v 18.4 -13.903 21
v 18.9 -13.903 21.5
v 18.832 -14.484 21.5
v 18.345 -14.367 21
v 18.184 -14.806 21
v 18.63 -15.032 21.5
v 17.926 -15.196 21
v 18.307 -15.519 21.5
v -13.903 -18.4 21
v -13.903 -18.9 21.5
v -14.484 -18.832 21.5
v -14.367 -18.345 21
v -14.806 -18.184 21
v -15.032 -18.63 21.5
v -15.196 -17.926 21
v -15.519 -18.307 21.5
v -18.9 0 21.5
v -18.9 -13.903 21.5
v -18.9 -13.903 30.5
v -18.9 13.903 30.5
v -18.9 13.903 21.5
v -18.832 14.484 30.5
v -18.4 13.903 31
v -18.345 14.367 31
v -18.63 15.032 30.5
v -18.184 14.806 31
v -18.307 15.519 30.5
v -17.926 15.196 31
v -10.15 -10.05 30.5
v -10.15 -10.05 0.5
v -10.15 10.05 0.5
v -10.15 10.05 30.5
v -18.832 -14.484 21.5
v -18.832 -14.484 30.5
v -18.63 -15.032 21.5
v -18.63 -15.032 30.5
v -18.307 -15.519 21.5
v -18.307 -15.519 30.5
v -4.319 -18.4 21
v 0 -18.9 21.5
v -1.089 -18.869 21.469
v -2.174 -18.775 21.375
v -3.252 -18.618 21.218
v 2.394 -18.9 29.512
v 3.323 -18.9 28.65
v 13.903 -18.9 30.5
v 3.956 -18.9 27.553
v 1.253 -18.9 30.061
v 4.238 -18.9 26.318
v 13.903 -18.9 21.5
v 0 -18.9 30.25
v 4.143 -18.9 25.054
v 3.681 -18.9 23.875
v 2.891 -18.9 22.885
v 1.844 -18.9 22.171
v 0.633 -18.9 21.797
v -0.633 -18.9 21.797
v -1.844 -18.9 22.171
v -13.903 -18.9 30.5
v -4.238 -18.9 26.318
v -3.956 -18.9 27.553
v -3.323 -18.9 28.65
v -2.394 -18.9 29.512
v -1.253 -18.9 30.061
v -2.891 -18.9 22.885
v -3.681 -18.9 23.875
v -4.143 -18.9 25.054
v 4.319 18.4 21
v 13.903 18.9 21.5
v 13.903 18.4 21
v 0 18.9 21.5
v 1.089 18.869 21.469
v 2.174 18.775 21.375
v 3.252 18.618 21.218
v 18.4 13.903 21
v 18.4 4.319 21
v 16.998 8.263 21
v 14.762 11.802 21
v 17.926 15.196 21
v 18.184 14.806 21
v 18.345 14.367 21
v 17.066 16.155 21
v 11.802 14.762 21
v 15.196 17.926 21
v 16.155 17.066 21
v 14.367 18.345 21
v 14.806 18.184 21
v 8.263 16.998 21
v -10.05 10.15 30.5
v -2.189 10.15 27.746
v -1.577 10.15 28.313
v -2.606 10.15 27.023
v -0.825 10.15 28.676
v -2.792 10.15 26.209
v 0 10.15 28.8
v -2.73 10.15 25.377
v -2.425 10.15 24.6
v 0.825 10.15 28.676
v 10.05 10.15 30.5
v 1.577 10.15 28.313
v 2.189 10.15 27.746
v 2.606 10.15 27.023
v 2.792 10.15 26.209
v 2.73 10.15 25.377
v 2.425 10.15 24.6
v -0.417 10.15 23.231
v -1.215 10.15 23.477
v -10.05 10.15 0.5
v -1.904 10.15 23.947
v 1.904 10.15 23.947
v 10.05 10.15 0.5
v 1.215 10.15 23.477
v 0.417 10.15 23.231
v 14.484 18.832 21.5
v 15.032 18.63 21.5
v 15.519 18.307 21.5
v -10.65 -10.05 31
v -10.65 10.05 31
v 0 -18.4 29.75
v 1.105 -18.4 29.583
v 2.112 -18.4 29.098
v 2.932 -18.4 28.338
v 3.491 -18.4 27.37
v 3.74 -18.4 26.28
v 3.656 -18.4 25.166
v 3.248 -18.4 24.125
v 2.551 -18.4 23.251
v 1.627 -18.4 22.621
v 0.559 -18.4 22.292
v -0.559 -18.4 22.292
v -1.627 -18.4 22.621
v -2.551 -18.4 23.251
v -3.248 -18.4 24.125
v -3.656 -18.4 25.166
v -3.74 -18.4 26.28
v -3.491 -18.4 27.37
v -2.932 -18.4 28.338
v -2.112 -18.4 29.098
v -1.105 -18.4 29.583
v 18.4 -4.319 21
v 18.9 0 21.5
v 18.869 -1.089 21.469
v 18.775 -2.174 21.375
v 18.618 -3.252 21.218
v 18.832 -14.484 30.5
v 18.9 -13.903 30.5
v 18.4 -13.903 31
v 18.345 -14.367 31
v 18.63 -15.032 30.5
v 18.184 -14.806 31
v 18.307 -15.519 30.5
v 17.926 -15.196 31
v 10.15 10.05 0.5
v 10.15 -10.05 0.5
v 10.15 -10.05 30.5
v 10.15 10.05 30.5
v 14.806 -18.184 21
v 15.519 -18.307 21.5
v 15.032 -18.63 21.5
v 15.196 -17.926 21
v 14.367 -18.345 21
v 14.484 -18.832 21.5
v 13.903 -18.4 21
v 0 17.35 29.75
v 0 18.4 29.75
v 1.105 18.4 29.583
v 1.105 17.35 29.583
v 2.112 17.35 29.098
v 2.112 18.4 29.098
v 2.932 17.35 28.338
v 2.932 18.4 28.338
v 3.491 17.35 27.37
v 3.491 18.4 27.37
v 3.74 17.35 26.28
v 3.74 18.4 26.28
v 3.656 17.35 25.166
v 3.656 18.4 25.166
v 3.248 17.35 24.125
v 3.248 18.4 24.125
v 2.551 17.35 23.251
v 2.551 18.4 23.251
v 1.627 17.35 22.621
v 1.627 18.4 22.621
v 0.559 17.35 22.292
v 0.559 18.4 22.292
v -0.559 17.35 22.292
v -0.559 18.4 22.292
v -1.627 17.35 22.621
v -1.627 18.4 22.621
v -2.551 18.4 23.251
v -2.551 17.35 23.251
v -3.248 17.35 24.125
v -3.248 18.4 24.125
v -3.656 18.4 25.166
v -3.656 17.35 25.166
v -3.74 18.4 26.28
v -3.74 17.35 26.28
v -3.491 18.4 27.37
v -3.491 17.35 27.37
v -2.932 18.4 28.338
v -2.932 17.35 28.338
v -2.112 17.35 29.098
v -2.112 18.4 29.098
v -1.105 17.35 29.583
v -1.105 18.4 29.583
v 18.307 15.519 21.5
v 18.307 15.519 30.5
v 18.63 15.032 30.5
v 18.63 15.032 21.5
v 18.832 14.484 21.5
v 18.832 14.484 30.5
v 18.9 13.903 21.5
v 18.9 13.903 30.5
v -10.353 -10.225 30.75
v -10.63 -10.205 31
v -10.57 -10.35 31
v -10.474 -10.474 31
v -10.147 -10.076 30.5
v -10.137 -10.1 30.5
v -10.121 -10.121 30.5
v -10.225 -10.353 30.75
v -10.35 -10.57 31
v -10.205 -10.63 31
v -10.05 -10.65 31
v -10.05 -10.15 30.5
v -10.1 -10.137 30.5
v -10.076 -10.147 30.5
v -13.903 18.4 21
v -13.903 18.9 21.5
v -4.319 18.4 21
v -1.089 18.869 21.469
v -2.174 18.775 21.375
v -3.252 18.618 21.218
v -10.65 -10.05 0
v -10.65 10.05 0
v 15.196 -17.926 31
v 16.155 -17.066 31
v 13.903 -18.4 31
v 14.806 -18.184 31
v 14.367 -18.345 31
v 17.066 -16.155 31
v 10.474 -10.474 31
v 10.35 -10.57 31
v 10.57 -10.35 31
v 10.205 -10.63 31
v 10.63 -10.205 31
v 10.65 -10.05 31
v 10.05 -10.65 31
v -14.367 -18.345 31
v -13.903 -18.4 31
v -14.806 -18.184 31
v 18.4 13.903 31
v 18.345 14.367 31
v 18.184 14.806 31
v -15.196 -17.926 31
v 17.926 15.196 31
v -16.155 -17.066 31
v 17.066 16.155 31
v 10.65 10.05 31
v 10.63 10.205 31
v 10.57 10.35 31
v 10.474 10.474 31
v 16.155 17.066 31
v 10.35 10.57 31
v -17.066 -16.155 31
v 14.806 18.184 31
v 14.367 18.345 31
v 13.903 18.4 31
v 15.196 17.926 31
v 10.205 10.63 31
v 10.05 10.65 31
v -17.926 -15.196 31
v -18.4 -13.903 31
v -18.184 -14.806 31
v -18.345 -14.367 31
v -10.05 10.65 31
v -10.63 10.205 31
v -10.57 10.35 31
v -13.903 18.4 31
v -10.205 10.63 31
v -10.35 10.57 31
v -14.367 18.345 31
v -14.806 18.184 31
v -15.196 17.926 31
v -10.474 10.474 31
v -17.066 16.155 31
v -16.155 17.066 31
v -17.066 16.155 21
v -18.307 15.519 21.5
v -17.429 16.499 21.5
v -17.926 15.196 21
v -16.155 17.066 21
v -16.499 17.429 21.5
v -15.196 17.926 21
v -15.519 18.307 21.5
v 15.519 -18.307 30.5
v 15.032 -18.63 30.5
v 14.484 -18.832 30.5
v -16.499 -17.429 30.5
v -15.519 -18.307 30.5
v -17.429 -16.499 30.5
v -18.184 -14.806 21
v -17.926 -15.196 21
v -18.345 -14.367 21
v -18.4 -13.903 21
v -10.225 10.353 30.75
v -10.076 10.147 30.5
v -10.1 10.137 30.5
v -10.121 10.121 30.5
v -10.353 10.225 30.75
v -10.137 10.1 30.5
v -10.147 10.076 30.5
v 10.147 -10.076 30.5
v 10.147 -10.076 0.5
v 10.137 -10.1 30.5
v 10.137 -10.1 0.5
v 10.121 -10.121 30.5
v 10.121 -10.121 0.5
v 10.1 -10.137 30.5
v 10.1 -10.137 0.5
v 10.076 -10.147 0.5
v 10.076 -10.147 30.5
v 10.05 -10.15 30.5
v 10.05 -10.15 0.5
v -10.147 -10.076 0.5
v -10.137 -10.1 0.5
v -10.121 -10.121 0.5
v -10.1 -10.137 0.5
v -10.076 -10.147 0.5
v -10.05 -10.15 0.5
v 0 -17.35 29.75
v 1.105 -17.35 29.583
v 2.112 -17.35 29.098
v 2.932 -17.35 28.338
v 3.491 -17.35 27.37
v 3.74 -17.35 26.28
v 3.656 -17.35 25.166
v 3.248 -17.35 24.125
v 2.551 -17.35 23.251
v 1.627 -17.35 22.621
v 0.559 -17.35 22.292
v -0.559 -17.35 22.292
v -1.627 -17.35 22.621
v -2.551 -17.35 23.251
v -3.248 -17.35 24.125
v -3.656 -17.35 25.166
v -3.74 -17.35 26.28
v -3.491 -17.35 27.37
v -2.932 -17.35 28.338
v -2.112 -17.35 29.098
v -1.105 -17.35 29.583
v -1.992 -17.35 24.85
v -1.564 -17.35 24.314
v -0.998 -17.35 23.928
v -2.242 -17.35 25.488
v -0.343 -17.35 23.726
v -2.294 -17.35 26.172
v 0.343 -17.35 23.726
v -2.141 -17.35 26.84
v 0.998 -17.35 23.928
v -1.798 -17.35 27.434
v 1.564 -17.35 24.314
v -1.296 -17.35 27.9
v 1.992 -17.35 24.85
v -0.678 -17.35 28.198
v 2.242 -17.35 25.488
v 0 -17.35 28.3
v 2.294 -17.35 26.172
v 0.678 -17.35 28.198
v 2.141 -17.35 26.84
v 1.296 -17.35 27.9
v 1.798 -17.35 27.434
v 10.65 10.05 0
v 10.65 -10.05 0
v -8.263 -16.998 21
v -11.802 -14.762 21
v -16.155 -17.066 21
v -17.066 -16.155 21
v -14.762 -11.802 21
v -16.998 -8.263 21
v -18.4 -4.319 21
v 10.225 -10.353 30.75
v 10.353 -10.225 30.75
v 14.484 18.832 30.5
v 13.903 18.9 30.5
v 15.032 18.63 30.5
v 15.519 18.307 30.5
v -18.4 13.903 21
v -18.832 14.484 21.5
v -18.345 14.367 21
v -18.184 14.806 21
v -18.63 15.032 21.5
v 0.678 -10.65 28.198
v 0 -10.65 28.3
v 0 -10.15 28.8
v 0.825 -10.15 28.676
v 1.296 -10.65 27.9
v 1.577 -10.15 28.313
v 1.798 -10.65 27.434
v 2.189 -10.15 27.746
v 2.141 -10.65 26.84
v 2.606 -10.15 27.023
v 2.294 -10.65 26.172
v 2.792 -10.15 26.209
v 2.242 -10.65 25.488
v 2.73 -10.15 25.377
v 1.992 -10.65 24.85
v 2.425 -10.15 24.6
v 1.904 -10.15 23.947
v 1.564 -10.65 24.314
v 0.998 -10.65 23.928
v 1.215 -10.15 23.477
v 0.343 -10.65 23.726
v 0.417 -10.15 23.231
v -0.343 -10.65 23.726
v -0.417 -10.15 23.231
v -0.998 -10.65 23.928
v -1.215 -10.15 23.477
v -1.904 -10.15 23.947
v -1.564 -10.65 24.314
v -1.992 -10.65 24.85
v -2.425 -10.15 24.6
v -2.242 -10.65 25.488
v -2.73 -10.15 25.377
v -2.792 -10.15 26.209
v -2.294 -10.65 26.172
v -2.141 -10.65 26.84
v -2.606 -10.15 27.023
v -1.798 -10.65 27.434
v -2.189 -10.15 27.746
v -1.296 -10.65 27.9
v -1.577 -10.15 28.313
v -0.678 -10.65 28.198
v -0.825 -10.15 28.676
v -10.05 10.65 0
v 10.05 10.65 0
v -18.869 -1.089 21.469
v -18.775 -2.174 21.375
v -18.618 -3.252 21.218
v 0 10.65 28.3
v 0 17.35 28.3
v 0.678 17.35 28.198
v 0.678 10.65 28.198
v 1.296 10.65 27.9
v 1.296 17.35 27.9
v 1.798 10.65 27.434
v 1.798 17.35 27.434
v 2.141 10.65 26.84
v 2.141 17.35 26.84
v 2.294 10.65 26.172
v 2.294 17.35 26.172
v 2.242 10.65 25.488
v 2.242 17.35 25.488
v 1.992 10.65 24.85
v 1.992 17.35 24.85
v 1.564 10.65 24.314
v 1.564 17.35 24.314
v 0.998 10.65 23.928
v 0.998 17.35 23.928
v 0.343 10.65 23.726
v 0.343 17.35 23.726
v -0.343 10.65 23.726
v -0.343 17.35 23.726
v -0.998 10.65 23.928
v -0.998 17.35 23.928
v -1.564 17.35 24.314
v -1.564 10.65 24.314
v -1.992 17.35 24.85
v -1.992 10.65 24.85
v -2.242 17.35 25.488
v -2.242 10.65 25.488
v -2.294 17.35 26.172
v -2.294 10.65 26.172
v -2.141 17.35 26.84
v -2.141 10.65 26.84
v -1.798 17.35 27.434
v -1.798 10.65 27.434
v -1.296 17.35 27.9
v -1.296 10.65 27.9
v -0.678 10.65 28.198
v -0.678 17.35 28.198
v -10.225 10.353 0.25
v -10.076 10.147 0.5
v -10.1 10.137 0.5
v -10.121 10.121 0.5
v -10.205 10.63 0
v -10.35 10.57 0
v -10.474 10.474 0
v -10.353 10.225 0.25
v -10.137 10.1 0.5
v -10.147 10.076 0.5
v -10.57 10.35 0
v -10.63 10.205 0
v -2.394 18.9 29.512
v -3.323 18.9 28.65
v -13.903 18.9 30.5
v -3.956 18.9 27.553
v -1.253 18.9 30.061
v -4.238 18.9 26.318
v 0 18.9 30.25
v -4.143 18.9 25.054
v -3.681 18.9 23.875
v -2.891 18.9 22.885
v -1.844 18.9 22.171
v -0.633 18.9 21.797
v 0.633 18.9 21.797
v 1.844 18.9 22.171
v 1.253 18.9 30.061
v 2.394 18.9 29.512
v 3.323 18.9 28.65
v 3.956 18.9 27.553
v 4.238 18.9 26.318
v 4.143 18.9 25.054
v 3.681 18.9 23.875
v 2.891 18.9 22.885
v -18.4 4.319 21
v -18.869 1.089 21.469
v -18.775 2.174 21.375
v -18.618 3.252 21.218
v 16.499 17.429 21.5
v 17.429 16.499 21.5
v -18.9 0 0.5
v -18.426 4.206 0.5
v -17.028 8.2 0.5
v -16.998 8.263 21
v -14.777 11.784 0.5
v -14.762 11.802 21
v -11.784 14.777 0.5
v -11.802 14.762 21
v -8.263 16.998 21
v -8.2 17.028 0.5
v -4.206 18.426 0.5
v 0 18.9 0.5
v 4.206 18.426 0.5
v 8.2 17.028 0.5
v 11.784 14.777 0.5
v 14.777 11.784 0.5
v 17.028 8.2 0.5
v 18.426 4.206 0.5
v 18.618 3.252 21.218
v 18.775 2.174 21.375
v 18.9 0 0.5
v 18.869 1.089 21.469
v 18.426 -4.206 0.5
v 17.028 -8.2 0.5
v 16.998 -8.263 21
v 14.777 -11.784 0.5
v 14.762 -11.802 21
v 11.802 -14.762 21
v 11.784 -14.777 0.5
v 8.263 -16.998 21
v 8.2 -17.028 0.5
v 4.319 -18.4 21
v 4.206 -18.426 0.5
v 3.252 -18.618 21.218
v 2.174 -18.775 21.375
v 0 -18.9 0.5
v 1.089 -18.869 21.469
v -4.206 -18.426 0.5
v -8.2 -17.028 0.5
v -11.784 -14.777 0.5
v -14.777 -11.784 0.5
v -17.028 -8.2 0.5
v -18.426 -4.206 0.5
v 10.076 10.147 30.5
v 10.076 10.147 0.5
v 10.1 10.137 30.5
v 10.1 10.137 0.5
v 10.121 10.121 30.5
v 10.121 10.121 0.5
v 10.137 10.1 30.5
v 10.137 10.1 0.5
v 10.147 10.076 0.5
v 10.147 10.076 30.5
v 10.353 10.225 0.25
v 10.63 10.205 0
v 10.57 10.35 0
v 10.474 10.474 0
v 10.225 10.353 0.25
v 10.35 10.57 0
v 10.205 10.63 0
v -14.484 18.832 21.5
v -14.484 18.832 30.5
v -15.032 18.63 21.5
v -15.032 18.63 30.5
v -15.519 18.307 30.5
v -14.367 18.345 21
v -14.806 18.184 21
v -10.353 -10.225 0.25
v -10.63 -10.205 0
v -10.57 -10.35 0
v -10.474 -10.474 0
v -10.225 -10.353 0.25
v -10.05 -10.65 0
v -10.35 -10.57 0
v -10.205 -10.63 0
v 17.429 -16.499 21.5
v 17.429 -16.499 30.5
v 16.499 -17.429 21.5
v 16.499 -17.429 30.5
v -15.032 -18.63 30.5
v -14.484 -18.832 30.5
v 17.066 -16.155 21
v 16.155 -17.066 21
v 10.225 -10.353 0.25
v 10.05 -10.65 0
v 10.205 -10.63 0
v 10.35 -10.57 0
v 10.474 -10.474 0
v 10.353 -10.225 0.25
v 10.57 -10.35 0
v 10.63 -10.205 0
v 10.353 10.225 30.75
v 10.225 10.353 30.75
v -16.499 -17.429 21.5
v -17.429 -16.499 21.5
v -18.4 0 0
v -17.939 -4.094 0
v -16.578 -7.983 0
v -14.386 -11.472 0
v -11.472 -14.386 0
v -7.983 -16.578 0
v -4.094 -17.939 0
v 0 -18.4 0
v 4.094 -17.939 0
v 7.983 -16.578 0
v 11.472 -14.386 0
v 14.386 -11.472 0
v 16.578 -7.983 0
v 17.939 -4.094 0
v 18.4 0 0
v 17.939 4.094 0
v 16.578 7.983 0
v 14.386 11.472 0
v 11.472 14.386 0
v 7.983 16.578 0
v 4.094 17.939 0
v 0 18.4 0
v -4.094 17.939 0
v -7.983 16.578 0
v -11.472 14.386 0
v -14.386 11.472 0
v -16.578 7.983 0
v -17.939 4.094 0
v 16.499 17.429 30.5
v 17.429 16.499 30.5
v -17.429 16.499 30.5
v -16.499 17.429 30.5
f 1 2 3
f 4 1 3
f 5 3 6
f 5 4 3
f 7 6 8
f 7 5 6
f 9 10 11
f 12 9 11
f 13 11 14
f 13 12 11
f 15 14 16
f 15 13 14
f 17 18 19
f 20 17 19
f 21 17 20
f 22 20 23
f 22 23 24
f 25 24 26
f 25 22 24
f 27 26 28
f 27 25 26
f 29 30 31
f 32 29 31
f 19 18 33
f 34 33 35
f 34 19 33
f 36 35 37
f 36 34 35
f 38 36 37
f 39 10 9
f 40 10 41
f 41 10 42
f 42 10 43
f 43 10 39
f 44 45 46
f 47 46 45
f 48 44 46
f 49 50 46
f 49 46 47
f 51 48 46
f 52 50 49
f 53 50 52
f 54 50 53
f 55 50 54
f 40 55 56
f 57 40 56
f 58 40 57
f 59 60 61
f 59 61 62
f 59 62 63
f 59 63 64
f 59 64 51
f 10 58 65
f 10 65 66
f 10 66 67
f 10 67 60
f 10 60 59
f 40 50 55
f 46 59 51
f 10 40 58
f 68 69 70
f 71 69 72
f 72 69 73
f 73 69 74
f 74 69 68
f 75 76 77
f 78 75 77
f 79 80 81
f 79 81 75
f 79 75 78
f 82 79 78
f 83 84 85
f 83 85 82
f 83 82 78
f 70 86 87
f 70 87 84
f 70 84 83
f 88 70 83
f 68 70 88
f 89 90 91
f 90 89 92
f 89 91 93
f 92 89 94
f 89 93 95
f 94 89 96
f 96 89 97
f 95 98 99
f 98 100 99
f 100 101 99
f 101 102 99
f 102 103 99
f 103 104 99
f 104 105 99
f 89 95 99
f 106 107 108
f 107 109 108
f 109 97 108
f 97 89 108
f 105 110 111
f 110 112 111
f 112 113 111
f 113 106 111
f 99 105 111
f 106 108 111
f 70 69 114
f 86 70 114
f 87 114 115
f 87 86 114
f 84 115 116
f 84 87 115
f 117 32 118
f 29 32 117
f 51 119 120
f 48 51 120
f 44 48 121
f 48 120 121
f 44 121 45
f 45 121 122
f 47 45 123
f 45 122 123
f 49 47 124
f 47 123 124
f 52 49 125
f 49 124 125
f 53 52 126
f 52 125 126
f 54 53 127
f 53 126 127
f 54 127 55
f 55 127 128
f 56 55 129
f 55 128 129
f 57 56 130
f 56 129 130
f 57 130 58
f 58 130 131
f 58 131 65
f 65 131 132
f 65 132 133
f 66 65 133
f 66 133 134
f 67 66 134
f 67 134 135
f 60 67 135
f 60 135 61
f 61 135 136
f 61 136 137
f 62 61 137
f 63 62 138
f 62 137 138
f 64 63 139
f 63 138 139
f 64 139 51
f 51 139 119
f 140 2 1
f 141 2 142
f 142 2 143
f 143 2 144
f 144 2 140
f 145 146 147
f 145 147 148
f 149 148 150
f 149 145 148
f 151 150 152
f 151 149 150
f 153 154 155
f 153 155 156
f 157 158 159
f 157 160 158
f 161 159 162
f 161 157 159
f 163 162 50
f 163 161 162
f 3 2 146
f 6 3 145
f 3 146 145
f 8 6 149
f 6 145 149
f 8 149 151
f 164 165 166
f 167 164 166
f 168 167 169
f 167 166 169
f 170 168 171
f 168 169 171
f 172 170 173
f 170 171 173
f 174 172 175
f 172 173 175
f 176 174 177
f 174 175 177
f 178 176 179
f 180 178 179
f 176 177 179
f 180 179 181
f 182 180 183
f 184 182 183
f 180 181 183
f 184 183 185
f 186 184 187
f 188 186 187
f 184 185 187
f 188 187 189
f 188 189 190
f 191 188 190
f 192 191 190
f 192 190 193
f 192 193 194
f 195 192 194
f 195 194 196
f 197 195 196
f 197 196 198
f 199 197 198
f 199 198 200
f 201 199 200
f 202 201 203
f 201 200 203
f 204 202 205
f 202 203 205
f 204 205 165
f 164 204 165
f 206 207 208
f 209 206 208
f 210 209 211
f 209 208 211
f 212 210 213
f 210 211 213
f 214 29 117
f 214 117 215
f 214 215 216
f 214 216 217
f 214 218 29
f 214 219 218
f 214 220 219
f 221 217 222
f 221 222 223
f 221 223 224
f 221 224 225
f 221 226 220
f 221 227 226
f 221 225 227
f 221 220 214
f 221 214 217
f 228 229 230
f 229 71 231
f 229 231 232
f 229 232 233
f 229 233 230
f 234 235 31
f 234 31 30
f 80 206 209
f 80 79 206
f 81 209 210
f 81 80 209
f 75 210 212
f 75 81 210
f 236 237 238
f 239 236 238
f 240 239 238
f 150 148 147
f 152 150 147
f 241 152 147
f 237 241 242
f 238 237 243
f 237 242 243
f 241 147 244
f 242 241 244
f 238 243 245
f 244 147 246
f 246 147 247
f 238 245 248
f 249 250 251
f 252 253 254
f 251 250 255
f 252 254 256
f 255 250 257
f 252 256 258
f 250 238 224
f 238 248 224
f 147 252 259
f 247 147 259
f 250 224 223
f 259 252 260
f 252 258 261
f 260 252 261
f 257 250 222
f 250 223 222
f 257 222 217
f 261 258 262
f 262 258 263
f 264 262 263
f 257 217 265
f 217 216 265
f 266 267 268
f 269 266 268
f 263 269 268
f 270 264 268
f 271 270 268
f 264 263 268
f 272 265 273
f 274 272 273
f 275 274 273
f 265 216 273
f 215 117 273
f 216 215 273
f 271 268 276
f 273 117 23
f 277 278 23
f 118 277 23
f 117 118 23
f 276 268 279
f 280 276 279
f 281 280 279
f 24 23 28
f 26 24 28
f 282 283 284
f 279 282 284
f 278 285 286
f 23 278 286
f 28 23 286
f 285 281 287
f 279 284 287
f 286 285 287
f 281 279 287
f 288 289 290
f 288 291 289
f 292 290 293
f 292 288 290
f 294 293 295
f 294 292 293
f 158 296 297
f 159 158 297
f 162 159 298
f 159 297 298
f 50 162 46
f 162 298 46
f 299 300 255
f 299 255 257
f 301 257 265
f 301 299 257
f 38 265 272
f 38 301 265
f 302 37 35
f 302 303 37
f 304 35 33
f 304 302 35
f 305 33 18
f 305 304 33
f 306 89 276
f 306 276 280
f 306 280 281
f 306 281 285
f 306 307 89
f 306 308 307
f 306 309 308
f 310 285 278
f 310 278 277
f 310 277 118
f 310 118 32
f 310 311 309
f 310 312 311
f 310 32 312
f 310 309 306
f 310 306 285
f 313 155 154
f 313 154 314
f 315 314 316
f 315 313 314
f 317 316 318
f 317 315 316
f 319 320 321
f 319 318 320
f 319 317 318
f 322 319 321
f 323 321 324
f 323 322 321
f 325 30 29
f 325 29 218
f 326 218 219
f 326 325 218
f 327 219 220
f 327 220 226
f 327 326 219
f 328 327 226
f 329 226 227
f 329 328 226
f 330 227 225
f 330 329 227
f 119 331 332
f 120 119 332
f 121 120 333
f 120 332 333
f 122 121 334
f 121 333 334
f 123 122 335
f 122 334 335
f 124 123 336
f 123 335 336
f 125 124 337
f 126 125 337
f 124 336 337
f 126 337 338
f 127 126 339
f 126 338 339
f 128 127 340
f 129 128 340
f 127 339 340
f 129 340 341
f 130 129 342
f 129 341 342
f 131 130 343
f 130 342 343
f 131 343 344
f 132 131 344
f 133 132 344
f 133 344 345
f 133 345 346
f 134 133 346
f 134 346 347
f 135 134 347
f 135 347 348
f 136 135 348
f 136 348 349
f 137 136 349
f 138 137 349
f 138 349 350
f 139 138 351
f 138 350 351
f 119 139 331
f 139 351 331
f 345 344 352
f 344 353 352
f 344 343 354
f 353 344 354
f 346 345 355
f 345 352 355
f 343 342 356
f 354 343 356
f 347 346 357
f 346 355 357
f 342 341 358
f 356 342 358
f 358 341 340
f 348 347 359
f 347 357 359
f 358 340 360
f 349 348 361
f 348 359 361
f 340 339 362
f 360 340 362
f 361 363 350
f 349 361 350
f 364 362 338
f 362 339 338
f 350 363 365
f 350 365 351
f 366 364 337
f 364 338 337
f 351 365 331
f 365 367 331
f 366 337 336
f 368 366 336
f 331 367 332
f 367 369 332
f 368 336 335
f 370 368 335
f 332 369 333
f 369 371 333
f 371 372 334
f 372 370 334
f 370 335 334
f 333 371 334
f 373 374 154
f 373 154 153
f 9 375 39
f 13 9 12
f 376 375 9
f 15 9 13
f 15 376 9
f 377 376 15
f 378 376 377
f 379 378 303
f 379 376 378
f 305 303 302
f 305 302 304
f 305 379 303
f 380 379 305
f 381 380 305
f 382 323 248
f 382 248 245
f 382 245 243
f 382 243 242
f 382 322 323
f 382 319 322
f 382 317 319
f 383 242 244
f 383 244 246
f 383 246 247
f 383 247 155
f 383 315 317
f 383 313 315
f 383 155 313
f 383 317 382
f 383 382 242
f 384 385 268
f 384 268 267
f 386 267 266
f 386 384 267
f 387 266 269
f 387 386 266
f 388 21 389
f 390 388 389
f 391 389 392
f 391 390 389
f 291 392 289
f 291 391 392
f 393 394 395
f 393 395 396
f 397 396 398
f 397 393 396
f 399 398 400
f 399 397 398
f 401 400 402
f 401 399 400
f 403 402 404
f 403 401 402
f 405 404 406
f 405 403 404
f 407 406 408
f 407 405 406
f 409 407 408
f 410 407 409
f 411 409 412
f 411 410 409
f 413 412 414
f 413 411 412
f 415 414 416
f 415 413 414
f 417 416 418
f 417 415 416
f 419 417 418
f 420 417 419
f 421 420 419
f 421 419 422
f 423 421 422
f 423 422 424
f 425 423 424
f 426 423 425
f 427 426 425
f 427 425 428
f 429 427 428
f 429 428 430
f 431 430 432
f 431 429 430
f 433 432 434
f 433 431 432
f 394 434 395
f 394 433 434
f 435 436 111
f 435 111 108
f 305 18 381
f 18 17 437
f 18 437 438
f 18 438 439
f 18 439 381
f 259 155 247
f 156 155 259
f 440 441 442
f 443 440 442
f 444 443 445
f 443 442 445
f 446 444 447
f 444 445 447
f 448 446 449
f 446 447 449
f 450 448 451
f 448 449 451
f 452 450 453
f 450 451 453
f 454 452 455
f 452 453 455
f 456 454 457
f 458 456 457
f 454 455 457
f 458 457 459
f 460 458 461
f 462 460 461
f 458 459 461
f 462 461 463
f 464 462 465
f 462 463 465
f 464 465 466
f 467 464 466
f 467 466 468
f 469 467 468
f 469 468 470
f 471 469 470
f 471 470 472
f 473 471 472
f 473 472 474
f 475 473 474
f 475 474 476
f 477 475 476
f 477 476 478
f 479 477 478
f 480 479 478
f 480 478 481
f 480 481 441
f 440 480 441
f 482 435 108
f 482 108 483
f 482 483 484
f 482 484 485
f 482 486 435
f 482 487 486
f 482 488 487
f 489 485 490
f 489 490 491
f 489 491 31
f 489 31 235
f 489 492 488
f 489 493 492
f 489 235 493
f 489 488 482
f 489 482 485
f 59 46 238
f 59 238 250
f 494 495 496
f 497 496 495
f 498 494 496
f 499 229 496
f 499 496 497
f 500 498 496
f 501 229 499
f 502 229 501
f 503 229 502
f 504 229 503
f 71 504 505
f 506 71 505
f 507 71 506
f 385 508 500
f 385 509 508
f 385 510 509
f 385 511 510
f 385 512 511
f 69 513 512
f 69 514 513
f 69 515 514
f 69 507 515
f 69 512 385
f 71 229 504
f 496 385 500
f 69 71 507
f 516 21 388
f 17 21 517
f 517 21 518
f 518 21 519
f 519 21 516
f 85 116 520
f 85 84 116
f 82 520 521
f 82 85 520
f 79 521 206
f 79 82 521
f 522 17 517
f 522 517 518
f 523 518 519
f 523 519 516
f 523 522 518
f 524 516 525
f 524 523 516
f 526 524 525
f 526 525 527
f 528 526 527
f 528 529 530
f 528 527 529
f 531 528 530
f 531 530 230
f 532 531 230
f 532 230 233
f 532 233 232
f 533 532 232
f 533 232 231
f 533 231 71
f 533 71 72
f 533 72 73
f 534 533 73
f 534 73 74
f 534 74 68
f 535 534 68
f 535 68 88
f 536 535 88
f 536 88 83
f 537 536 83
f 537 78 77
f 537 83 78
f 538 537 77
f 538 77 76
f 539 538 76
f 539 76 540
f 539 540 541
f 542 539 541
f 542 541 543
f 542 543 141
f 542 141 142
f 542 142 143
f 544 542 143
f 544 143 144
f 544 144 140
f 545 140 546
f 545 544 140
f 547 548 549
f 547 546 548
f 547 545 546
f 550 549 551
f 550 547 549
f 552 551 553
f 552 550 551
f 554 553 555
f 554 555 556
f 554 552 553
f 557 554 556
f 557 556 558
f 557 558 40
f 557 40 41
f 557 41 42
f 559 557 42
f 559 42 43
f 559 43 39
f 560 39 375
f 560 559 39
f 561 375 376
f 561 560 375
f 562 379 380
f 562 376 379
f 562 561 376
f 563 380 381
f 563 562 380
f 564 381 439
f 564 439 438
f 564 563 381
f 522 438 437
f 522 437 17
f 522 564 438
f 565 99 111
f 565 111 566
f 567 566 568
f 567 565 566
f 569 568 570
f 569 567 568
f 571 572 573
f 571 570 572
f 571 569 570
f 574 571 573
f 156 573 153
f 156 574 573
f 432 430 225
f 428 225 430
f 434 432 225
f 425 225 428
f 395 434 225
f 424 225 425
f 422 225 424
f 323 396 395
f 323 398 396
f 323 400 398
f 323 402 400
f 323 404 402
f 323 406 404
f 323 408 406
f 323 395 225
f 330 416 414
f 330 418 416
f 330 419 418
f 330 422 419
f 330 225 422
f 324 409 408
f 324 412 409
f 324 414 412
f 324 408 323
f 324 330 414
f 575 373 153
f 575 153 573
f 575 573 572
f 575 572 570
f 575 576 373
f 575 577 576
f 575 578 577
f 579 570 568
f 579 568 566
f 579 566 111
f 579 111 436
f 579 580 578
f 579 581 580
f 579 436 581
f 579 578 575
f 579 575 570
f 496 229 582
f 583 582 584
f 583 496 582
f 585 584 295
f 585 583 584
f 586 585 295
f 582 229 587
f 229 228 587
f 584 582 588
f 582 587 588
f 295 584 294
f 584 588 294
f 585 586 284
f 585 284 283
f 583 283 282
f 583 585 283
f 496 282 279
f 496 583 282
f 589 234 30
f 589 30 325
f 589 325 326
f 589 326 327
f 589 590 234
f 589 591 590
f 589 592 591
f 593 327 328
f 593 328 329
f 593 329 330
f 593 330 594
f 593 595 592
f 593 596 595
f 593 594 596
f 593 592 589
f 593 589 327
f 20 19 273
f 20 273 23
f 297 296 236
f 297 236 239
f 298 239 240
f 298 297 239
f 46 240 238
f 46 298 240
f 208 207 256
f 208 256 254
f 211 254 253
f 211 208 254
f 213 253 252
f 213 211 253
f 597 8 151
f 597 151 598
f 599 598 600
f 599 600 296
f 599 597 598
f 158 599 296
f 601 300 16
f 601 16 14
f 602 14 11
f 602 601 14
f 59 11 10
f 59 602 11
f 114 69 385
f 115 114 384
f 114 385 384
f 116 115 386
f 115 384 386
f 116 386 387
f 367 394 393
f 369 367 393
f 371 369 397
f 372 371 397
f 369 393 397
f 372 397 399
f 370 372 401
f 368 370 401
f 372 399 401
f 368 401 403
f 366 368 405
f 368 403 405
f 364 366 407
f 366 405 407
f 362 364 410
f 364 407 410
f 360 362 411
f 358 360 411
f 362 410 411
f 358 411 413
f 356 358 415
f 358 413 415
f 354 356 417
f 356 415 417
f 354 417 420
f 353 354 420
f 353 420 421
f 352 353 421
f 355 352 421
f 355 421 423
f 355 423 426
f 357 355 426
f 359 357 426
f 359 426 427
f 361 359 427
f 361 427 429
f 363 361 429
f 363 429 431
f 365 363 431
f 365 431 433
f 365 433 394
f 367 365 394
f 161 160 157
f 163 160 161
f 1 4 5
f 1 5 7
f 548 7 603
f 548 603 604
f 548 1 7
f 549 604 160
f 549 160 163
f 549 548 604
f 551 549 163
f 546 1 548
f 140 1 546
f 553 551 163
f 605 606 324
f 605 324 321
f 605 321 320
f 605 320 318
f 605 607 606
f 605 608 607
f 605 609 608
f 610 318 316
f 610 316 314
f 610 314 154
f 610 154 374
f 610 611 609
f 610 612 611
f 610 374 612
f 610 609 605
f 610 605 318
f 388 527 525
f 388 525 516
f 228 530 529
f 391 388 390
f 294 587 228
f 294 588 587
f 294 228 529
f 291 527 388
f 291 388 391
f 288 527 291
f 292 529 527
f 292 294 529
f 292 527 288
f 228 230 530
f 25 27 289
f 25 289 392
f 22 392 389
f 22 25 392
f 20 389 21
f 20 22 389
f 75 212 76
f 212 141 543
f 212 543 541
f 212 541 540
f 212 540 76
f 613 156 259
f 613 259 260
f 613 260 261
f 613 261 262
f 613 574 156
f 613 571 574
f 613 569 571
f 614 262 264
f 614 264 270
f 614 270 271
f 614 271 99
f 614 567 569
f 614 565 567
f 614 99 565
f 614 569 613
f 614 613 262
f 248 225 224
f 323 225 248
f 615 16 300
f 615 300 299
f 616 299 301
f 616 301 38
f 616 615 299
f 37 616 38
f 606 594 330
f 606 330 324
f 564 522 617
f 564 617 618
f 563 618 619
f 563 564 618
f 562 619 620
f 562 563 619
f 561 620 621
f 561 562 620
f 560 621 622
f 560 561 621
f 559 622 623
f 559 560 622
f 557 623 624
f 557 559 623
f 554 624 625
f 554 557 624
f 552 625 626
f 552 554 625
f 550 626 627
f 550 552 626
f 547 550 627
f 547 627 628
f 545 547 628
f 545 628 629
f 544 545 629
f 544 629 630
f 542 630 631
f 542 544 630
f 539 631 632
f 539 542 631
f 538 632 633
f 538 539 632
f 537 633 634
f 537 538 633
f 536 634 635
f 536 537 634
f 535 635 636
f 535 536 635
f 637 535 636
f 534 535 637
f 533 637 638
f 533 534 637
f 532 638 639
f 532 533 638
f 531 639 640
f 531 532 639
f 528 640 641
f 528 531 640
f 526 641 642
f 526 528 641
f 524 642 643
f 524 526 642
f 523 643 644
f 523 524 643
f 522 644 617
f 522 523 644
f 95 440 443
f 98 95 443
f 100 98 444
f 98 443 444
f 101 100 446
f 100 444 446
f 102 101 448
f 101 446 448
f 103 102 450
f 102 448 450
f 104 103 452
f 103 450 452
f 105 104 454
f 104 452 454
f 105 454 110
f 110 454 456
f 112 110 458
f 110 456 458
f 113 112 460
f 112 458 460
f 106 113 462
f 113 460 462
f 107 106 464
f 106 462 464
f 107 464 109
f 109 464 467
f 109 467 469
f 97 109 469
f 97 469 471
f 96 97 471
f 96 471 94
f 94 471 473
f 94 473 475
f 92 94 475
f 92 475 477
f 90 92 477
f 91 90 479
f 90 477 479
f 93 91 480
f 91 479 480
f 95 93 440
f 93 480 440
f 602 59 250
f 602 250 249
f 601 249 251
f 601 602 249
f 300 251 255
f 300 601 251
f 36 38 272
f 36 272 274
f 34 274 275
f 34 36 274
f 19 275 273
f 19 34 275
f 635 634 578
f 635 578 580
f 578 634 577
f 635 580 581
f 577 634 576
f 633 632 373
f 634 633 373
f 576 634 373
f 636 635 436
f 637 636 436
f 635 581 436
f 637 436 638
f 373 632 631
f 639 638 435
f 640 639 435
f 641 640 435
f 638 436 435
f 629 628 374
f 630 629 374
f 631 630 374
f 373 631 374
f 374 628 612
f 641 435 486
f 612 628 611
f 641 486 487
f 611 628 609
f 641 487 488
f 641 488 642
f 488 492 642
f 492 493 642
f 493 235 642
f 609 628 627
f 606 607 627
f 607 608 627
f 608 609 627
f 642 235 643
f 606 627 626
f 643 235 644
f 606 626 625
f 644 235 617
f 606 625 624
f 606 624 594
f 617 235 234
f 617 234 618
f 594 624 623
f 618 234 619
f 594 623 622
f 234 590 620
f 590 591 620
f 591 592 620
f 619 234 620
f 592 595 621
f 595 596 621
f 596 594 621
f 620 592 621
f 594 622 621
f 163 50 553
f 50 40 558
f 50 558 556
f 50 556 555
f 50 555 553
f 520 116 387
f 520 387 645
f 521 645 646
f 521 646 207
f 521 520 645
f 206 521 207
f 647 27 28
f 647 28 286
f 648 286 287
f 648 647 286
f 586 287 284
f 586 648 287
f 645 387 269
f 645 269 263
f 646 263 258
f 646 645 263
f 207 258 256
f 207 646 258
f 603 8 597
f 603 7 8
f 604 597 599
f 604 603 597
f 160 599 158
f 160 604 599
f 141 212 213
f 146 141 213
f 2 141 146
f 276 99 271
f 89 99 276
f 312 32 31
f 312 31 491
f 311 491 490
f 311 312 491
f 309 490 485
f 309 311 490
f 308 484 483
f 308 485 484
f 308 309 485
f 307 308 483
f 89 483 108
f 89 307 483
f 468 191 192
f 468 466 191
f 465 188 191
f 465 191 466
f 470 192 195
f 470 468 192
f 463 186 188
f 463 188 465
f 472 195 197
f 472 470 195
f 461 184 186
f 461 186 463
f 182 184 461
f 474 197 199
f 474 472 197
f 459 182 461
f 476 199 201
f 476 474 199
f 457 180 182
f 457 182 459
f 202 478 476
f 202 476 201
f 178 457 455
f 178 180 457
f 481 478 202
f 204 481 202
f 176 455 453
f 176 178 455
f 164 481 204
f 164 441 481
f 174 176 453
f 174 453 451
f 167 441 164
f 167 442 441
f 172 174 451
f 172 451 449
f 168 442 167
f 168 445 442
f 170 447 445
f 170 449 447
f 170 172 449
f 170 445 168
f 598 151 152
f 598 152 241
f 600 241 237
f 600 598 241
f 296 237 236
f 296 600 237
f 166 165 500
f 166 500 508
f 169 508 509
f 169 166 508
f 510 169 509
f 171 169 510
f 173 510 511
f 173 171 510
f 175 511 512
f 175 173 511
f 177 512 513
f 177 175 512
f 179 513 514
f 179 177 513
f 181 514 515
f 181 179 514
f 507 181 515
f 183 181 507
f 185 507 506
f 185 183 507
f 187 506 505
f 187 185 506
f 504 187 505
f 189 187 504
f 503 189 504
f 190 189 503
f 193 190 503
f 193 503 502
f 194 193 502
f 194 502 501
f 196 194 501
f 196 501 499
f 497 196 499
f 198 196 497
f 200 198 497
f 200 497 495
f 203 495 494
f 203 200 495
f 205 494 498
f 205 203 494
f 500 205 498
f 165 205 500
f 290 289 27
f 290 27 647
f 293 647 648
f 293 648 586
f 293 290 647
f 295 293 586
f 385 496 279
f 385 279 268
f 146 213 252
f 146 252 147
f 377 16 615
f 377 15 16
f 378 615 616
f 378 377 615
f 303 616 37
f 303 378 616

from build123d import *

# Parameters (mm, degrees)
SKIZZE1_R                       = 18.9
SKIZZE1_W                       = 20.3
SKIZZE1_H                       = 20.3
AUFSATZ_LINEAR_AUSTRAGEN1_DEPTH = 21
SKIZZE2_W                       = 20.3
SKIZZE2_H                       = 20.3
AUFSATZ_LINEAR_AUSTRAGEN2_DEPTH = 10
SKIZZE3_R                       = 2.3
SCHNITT_LINEAR_AUSTRAGEN1_DEPTH = 53.412307715
SKETCH1_R                       = 3.75
CUT_EXTRUDE1_DEPTH              = 1.55
CUT_EXTRUDE2_START              = -36.25
SKETCH1_2_R                     = 3.75
CUT_EXTRUDE2_DEPTH              = 1.55
VERRUNDUNG1_R                   = 0.1
VERRUNDUNG2_R                   = 2.5
FASE1_SIZE                      = 0.5
FASE4_SIZE                      = 0.5


with BuildPart() as part:
    # Skizze1 → Aufsatz-Linear austragen1 (new body)
    with BuildSketch(Plane.XY):
        with Locations(Location((0, 0, 0), (0, 0, 180))):
            Circle(SKIZZE1_R)
        Rectangle(SKIZZE1_W, SKIZZE1_H, mode=Mode.SUBTRACT)
    extrude(amount=AUFSATZ_LINEAR_AUSTRAGEN1_DEPTH)

    # Skizze2 → Aufsatz-Linear austragen2 (add)
    with BuildSketch(Plane.XY.offset(21)):
        with BuildLine():
            Line((-14.791551643, 18.9), (14.791551643, 18.9))
            ThreePointArc((14.791551643, 18.9), (16.970562748, 16.970562748), (18.9, 14.791551643))
            Line((18.9, 14.791551643), (18.9, -14.791551643))
            ThreePointArc((18.9, -14.791551643), (16.970562748, -16.970562748), (14.791551643, -18.9))
            Line((14.791551643, -18.9), (-14.791551643, -18.9))
            ThreePointArc((-14.791551643, -18.9), (-16.970562748, -16.970562748), (-18.9, -14.791551643))
            Line((-18.9, -14.791551643), (-18.9, 14.791551643))
            ThreePointArc((-18.9, 14.791551643), (-16.970562748, 16.970562748), (-14.791551643, 18.9))
        make_face()
        Rectangle(SKIZZE2_W, SKIZZE2_H, mode=Mode.SUBTRACT)
    extrude(amount=AUFSATZ_LINEAR_AUSTRAGEN2_DEPTH)

    # Skizze3 → Schnitt-Linear austragen1 (cut, through all)
    with BuildSketch(Plane(origin=(0, 18.9, 0), x_dir=(1, 0, 0), z_dir=(0, 1, 0))):
        with Locations(Location((0, -26, 0), (0, 0, 270))):
            Circle(SKIZZE3_R)
    extrude(amount=-SCHNITT_LINEAR_AUSTRAGEN1_DEPTH, mode=Mode.SUBTRACT)

    # Sketch1 → Cut-Extrude1 (cut)
    with BuildSketch(Plane(origin=(0, 18.9, 0), x_dir=(1, 0, 0), z_dir=(0, 1, 0))):
        with Locations(Location((0, -26, 0), (0, 0, 270))):
            Circle(SKETCH1_R)
    extrude(amount=-CUT_EXTRUDE1_DEPTH, mode=Mode.SUBTRACT)

    # Sketch1<2> → Cut-Extrude2 (cut)
    with BuildSketch(Plane(origin=(0, 18.9, 0), x_dir=(1, 0, 0), z_dir=(0, 1, 0)).offset(CUT_EXTRUDE2_START)):
        with Locations(Location((0, -26, 0), (0, 0, 270))):
            Circle(SKETCH1_2_R)
    extrude(amount=-CUT_EXTRUDE2_DEPTH, mode=Mode.SUBTRACT)

    # Verrundung1
    verrundung1_edges = [part.edges().sort_by_distance(p)[0] for p in [
        (10.15, -10.15, 15.5),
        (10.15, 10.15, 15.5),
        (-10.15, 10.15, 15.5),
        (-10.15, -10.15, 15.5),
    ]]
    fillet(verrundung1_edges, radius=VERRUNDUNG1_R)

    # Verrundung2
    verrundung2_edges = [part.edges().sort_by_distance(p)[0] for p in [
        (-14.791551643, 18.9, 26),
        (-18.9, 14.791551643, 26),
        (-18.9, -14.791551643, 26),
        (-14.791551643, -18.9, 26),
        (14.791551643, -18.9, 26),
        (18.9, -14.791551643, 26),
        (18.9, 14.791551643, 26),
        (14.791551643, 18.9, 26),
    ]]
    fillet(verrundung2_edges, radius=VERRUNDUNG2_R)

    # Fase1
    fase1_edges = [part.edges().sort_by_distance(p)[0] for p in [
        (-16.970562748, -16.970562748, 31),
        (-18.9, 0, 31),
        (-16.970562748, 16.970562748, 31),
        (0, -18.9, 31),
        (16.970562748, -16.970562748, 31),
        (18.9, 0, 31),
        (16.970562748, 16.970562748, 31),
        (0, 18.9, 31),
        (-14.76385305, 18.747066452, 31),
        (-18.747066452, 14.76385305, 31),
        (14.76385305, 18.747066452, 31),
        (18.747066452, 14.76385305, 31),
        (18.747066452, -14.76385305, 31),
        (14.76385305, -18.747066452, 31),
        (-14.76385305, -18.747066452, 31),
        (-18.747066452, -14.76385305, 31),
        (18.9, 0, 0),
        (0, -10.15, 23.7),
        (0, 10.15, 23.7),
        (0, 18.9, 22.25),
        (0, -18.9, 22.25),
        (0, -10.15, 0),
        (0, -10.15, 31),
        (10.15, 0, 0),
        (10.15, 0, 31),
        (-10.15, 0, 0),
        (-10.15, 0, 31),
        (0, 10.15, 0),
        (0, 10.15, 31),
        (10.120710678, -10.120710678, 0),
        (10.120710678, -10.120710678, 31),
        (-10.120710678, -10.120710678, 0),
        (-10.120710678, -10.120710678, 31),
        (-10.120710678, 10.120710678, 0),
        (-10.120710678, 10.120710678, 31),
        (10.120710678, 10.120710678, 0),
        (10.120710678, 10.120710678, 31),
    ]]
    chamfer(fase1_edges, length=FASE1_SIZE)

    # Fase4
    # the kernel refuses this chamfer: 0.5 mm, written as the material it takes off along each edge
    with BuildSketch(Plane(origin=(0, 0, 21), x_dir=(-0.6466454604660656, -0.762790697674421, 0), z_dir=(0.762790697674421, -0.6466454604660656, 0))) as fase4_piece_1:
        Polygon((24, -FASE4_SIZE), (24 - FASE4_SIZE, 0), (24, 0), align=None)
    revolve(axis=Axis((0, 0, 21), (0, 0, -1)), revolution_arc=9.421682318, mode=Mode.SUBTRACT)
    with BuildSketch(Plane(origin=(0, -18.9, 21), x_dir=(0, -0.027495876610589005, 0.9996219169112968), z_dir=(-1, 0, 0))) as fase4_piece_2_section:
        Polygon((FASE4_SIZE * 0.999621916911, FASE4_SIZE * 0.0274958766106), (-FASE4_SIZE * 0.0274958766106, FASE4_SIZE * 0.999621916911), (0, 0), align=None)
    fase4_piece_2 = extrude(amount=13.9028774, mode=Mode.PRIVATE)
    fase4_piece_2 = fase4_piece_2 - Plane(origin=(0, 0, 21.173530337), x_dir=(-1, 0, 0), z_dir=(0, 0, -1)) * Cylinder(18.9, 30, mode=Mode.PRIVATE)
    add(fase4_piece_2, mode=Mode.SUBTRACT)
    with BuildSketch(Plane(origin=(-13.9028774, -16.4, 21), x_dir=(0, -1, 0), z_dir=(1, 0, 0))) as fase4_piece_3:
        Polygon((2.5, -FASE4_SIZE), (2.5 - FASE4_SIZE, 0), (2.5, 0), align=None)
    revolve(axis=Axis((-13.9028774, -16.4, 21), (0, 0, -1)), revolution_arc=40.289158841, mode=Mode.SUBTRACT)
    with BuildSketch(Plane(origin=(-16.4, -13.9028774, 21), x_dir=(-0.7627906976744183, -0.6466454604660687, 0), z_dir=(0.6466454604660687, -0.7627906976744183, 0))) as fase4_piece_4:
        Polygon((2.5, -FASE4_SIZE), (2.5 - FASE4_SIZE, 0), (2.5, 0), align=None)
    revolve(axis=Axis((-16.4, -13.9028774, 21), (0, 0, -1)), revolution_arc=40.289158841, mode=Mode.SUBTRACT)
    with BuildSketch(Plane(origin=(-18.9, 0, 21), x_dir=(-0.027495876610589005, 0, 0.9996219169112968), z_dir=(0, 1, 0))) as fase4_piece_5_section:
        Polygon((FASE4_SIZE * 0.999621916911, FASE4_SIZE * 0.0274958766106), (-FASE4_SIZE * 0.0274958766106, FASE4_SIZE * 0.999621916911), (0, 0), align=None)
    fase4_piece_5 = extrude(amount=13.9028774, mode=Mode.PRIVATE)
    fase4_piece_5 = fase4_piece_5 - Plane(origin=(0, 0, 21.173530342), x_dir=(-1, 0, 0), z_dir=(0, 0, -1)) * Cylinder(18.9, 30, mode=Mode.PRIVATE)
    add(fase4_piece_5, mode=Mode.SUBTRACT)
    with BuildSketch(Plane(origin=(0, 0, 21), x_dir=(0.7627906976744181, -0.646645460466069, 0), z_dir=(0.646645460466069, 0.7627906976744181, 0))) as fase4_piece_6:
        Polygon((24, -FASE4_SIZE), (24 - FASE4_SIZE, 0), (24, 0), align=None)
    revolve(axis=Axis((0, 0, 21), (0, 0, -1)), revolution_arc=9.421682318, mode=Mode.SUBTRACT)
    with BuildSketch(Plane(origin=(18.9, -8.6e-08, 21), x_dir=(0.027495876610589005, 0, 0.9996219169112968), z_dir=(0, -1, 0))) as fase4_piece_7_section:
        Polygon((FASE4_SIZE * 0.999621916911, FASE4_SIZE * 0.0274958766106), (-FASE4_SIZE * 0.0274958766106, FASE4_SIZE * 0.999621916911), (0, 0), align=None)
    fase4_piece_7 = extrude(amount=13.902877314, mode=Mode.PRIVATE)
    fase4_piece_7 = fase4_piece_7 - Plane(origin=(0, 0, 21.173530337), x_dir=(-1, 0, 0), z_dir=(0, 0, -1)) * Cylinder(18.9, 30, mode=Mode.PRIVATE)
    add(fase4_piece_7, mode=Mode.SUBTRACT)
    with BuildSketch(Plane(origin=(16.4, -13.9028774, 21), x_dir=(1, 0, 0), z_dir=(0, 1, 0))) as fase4_piece_8:
        Polygon((2.5, -FASE4_SIZE), (2.5 - FASE4_SIZE, 0), (2.5, 0), align=None)
    revolve(axis=Axis((16.4, -13.9028774, 21), (0, 0, -1)), revolution_arc=40.289158841, mode=Mode.SUBTRACT)
    with BuildSketch(Plane(origin=(13.9028774, -16.4, 21), x_dir=(0.64664546046607, -0.7627906976744174, 0), z_dir=(0.7627906976744174, 0.64664546046607, 0))) as fase4_piece_9:
        Polygon((2.5, -FASE4_SIZE), (2.5 - FASE4_SIZE, 0), (2.5, 0), align=None)
    revolve(axis=Axis((13.9028774, -16.4, 21), (0, 0, -1)), revolution_arc=40.289158841, mode=Mode.SUBTRACT)
    with BuildSketch(Plane(origin=(0, 0, 21), x_dir=(0.6466454604660691, 0.762790697674418, 0), z_dir=(-0.762790697674418, 0.6466454604660691, 0))) as fase4_piece_10:
        Polygon((24, -FASE4_SIZE), (24 - FASE4_SIZE, 0), (24, 0), align=None)
    revolve(axis=Axis((0, 0, 21), (0, 0, -1)), revolution_arc=9.421682318, mode=Mode.SUBTRACT)
    with BuildSketch(Plane(origin=(2.2e-08, 18.9, 21), x_dir=(0, 0.027495876610589005, 0.9996219169112968), z_dir=(1, 0, 0))) as fase4_piece_11_section:
        Polygon((FASE4_SIZE * 0.999621916911, FASE4_SIZE * 0.0274958766106), (-FASE4_SIZE * 0.0274958766106, FASE4_SIZE * 0.999621916911), (0, 0), align=None)
    fase4_piece_11 = extrude(amount=13.902877378, mode=Mode.PRIVATE)
    fase4_piece_11 = fase4_piece_11 - Plane(origin=(0, 0, 21.173530337), x_dir=(-1, 0, 0), z_dir=(0, 0, -1)) * Cylinder(18.9, 30, mode=Mode.PRIVATE)
    add(fase4_piece_11, mode=Mode.SUBTRACT)
    with BuildSketch(Plane(origin=(13.9028774, 16.4, 21), x_dir=(0, 1, 0), z_dir=(-1, 0, 0))) as fase4_piece_12:
        Polygon((2.5, -FASE4_SIZE), (2.5 - FASE4_SIZE, 0), (2.5, 0), align=None)
    revolve(axis=Axis((13.9028774, 16.4, 21), (0, 0, -1)), revolution_arc=40.289158841, mode=Mode.SUBTRACT)
    with BuildSketch(Plane(origin=(16.4, 13.9028774, 21), x_dir=(0.7627906976744174, 0.64664546046607, 0), z_dir=(-0.64664546046607, 0.7627906976744174, 0))) as fase4_piece_13:
        Polygon((2.5, -FASE4_SIZE), (2.5 - FASE4_SIZE, 0), (2.5, 0), align=None)
    revolve(axis=Axis((16.4, 13.9028774, 21), (0, 0, -1)), revolution_arc=40.289158841, mode=Mode.SUBTRACT)
    with BuildSketch(Plane(origin=(0, 0, 21), x_dir=(-0.7627906976744193, 0.6466454604660676, 0), z_dir=(-0.6466454604660676, -0.7627906976744193, 0))) as fase4_piece_14:
        Polygon((24, -FASE4_SIZE), (24 - FASE4_SIZE, 0), (24, 0), align=None)
    revolve(axis=Axis((0, 0, 21), (0, 0, -1)), revolution_arc=9.421682318, mode=Mode.SUBTRACT)
    with BuildSketch(Plane(origin=(-13.9028774, 16.4, 21), x_dir=(0, 1, 0), z_dir=(1, 0, 0))) as fase4_piece_15:
        Polygon((2.5, FASE4_SIZE), (2.5 - FASE4_SIZE, 0), (2.5, 0), align=None)
    revolve(axis=Axis((-13.9028774, 16.4, 21), (0, 0, 1)), revolution_arc=40.289158841, mode=Mode.SUBTRACT)
    with BuildSketch(Plane(origin=(-16.4, 13.9028774, 21), x_dir=(-1, 0, 0), z_dir=(0, -1, 0))) as fase4_piece_16:
        Polygon((2.5, -FASE4_SIZE), (2.5 - FASE4_SIZE, 0), (2.5, 0), align=None)
    revolve(axis=Axis((-16.4, 13.9028774, 21), (0, 0, -1)), revolution_arc=40.289158841, mode=Mode.SUBTRACT)
    with BuildSketch(Plane(origin=(-18.9, -13.9028774, 21), x_dir=(-0.027495876610589005, 0, 0.9996219169112968), z_dir=(0, 1, 0))) as fase4_piece_17_section:
        Polygon((FASE4_SIZE * 0.999621916911, FASE4_SIZE * 0.0274958766106), (-FASE4_SIZE * 0.0274958766106, FASE4_SIZE * 0.999621916911), (0, 0), align=None)
    fase4_piece_17 = extrude(amount=13.9028774, mode=Mode.PRIVATE)
    fase4_piece_17 = fase4_piece_17 - Plane(origin=(0, 0, 21.173530332), x_dir=(-1, 0, 0), z_dir=(0, 0, -1)) * Cylinder(18.9, 30, mode=Mode.PRIVATE)
    add(fase4_piece_17, mode=Mode.SUBTRACT)
    with BuildSketch(Plane(origin=(13.9028774, -18.9, 21), x_dir=(0, -0.027495876610589005, 0.9996219169112968), z_dir=(-1, 0, 0))) as fase4_piece_18_section:
        Polygon((FASE4_SIZE * 0.999621916911, FASE4_SIZE * 0.0274958766106), (-FASE4_SIZE * 0.0274958766106, FASE4_SIZE * 0.999621916911), (0, 0), align=None)
    fase4_piece_18 = extrude(amount=13.9028774, mode=Mode.PRIVATE)
    fase4_piece_18 = fase4_piece_18 - Plane(origin=(0, 0, 21.173530332), x_dir=(-1, 0, 0), z_dir=(0, 0, -1)) * Cylinder(18.9, 30, mode=Mode.PRIVATE)
    add(fase4_piece_18, mode=Mode.SUBTRACT)
    with BuildSketch(Plane(origin=(18.9, 13.9028774, 21), x_dir=(0.027495876610589005, 0, 0.9996219169112968), z_dir=(0, -1, 0))) as fase4_piece_19_section:
        Polygon((FASE4_SIZE * 0.999621916911, FASE4_SIZE * 0.0274958766106), (-FASE4_SIZE * 0.0274958766106, FASE4_SIZE * 0.999621916911), (0, 0), align=None)
    fase4_piece_19 = extrude(amount=13.902877486, mode=Mode.PRIVATE)
    fase4_piece_19 = fase4_piece_19 - Plane(origin=(0, 0, 21.173530332), x_dir=(-1, 0, 0), z_dir=(0, 0, -1)) * Cylinder(18.9, 30, mode=Mode.PRIVATE)
    add(fase4_piece_19, mode=Mode.SUBTRACT)
    with BuildSketch(Plane(origin=(-13.9028774, 18.9, 21), x_dir=(0, 0.027495876610589005, 0.9996219169112968), z_dir=(1, 0, 0))) as fase4_piece_20_section:
        Polygon((FASE4_SIZE * 0.999621916911, FASE4_SIZE * 0.0274958766106), (-FASE4_SIZE * 0.0274958766106, FASE4_SIZE * 0.999621916911), (0, 0), align=None)
    fase4_piece_20 = extrude(amount=13.902877422, mode=Mode.PRIVATE)
    fase4_piece_20 = fase4_piece_20 - Plane(origin=(0, 0, 21.173530342), x_dir=(-1, 0, 0), z_dir=(0, 0, -1)) * Cylinder(18.9, 30, mode=Mode.PRIVATE)
    add(fase4_piece_20, mode=Mode.SUBTRACT)


solid = part.part
